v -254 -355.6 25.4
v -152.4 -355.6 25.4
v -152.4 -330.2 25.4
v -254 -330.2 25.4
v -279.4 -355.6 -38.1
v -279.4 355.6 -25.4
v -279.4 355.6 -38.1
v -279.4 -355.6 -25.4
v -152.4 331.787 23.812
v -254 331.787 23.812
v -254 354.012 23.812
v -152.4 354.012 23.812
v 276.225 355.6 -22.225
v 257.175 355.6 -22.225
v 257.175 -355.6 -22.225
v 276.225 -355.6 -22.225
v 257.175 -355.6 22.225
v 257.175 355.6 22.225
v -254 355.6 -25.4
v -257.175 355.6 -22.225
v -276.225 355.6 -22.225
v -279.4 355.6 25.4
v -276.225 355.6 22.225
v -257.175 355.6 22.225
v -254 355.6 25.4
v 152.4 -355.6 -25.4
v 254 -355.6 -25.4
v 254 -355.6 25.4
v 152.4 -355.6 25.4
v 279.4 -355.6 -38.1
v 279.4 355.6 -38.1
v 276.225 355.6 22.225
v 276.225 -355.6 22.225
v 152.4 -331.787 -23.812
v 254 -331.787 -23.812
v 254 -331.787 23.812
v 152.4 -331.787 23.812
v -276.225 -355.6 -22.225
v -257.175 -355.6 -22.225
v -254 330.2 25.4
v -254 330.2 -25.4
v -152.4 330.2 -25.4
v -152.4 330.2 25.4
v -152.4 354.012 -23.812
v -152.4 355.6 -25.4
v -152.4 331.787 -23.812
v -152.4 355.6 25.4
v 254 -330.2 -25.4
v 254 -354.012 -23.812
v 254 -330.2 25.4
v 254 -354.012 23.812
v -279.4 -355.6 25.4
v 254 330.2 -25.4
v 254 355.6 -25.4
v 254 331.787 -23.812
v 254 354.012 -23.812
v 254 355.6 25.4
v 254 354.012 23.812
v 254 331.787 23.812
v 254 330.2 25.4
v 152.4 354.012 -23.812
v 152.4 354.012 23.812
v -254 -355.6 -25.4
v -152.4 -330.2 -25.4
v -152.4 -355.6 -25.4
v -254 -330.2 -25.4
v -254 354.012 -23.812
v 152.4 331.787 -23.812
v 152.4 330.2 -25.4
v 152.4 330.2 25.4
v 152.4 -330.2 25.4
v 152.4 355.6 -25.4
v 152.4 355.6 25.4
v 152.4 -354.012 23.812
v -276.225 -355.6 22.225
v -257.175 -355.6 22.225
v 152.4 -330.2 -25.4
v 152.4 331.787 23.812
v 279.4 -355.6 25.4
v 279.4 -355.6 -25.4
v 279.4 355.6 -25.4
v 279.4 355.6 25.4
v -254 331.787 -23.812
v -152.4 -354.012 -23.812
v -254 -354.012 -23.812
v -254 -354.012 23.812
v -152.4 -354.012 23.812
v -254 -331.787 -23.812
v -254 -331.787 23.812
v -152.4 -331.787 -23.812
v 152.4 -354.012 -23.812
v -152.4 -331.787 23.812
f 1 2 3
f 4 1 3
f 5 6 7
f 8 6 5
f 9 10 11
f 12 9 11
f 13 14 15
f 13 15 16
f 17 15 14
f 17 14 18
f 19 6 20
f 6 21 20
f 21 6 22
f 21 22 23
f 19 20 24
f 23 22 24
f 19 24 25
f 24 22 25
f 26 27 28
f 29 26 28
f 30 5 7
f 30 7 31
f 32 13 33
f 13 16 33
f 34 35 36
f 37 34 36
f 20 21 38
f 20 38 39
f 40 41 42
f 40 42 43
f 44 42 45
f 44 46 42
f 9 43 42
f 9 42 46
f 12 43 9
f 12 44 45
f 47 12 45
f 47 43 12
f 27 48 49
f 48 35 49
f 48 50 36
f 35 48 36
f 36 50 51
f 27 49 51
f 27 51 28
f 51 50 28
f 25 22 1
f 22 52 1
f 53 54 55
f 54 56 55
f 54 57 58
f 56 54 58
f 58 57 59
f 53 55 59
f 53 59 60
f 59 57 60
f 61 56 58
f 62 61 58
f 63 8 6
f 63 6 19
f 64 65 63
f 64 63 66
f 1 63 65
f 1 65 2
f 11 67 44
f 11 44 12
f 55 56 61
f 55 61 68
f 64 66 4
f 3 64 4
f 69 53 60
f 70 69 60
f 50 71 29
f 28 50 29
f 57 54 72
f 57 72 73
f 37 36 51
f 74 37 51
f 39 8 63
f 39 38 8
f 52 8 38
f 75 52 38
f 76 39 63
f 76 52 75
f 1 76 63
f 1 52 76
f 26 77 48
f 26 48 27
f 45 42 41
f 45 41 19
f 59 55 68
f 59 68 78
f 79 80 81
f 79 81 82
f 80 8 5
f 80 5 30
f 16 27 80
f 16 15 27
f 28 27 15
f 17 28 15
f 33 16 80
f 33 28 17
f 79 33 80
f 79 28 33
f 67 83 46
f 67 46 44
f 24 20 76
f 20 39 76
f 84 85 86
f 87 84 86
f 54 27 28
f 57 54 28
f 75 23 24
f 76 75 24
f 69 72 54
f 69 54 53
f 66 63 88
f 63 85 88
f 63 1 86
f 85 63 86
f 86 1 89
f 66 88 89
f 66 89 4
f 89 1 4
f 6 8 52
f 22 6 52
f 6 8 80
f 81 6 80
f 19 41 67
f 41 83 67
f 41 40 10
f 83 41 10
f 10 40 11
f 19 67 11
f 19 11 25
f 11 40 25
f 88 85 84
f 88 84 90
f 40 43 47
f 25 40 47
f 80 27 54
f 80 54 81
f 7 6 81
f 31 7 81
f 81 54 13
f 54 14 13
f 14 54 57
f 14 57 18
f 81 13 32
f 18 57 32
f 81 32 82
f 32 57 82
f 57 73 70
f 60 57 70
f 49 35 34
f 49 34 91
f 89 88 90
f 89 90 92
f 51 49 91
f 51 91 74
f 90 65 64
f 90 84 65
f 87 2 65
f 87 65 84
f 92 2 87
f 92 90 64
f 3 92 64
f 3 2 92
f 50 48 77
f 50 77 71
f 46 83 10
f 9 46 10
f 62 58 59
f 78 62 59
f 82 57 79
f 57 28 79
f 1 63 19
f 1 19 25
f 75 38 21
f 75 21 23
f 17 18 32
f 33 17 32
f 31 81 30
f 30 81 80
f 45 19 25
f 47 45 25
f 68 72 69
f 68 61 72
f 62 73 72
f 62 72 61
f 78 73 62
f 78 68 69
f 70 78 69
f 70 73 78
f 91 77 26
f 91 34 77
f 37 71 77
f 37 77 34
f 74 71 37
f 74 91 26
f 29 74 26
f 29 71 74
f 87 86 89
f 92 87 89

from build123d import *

# Parameters (mm, degrees)
F0_W          = 25.4
F0_H          = 50.8
F0_W_2        = 19.05
F0_H_2        = 44.45
F1_DEPTH      = 355.6
F1_DEPTH_BACK = 355.6
F2_W          = 558.8
F2_H          = 711.2
F3_DEPTH      = 12.7
F4_W          = 25.4
F4_H          = 50.8
F4_W_2        = 22.225
F4_H_2        = 47.625
F5_DEPTH      = 101.6
F6_W          = 25.4
F6_H          = 50.8
F6_W_2        = 22.225
F6_H_2        = 47.625
F7_DEPTH      = 101.6


with BuildPart() as f1:
    # F0 (on Front) → F1 (new body, two sides)
    with BuildSketch(Plane.XZ) as f1_sk:
        with Locations((-266.7, 0)):
            Rectangle(F0_W, F0_H)
        with Locations((-266.7, 0)):
            Rectangle(F0_W_2, F0_H_2, mode=Mode.SUBTRACT)
        with Locations((266.7, 0)):
            Rectangle(F0_W, F0_H)
        with Locations((266.7, 0)):
            Rectangle(F0_W_2, F0_H_2, mode=Mode.SUBTRACT)
    extrude(amount=F1_DEPTH)
    extrude(f1_sk.sketch, amount=-F1_DEPTH_BACK)


with BuildPart() as f3:
    # F2 (on face) → F3 (new body)
    with BuildSketch(Plane(origin=(0, 0, -25.4), x_dir=(1, 0, 0), z_dir=(0, 0, -1))):
        Rectangle(F2_W, F2_H)
    extrude(amount=F3_DEPTH)


with BuildPart() as f5:
    # F4 (on face) → F5 (new body)
    with BuildSketch(Plane(origin=(254, 0, 0), x_dir=(0, -1, 0), z_dir=(-1, 0, 0))):
        with Locations((-342.9, 0)):
            Rectangle(F4_W, F4_H)
        with Locations((-342.9, 0)):
            Rectangle(F4_W_2, F4_H_2, mode=Mode.SUBTRACT)
        with Locations((342.9, 0)):
            Rectangle(F4_W, F4_H)
        with Locations((342.9, 0)):
            Rectangle(F4_W_2, F4_H_2, mode=Mode.SUBTRACT)
    extrude(amount=F5_DEPTH)


with BuildPart() as f7:
    # F6 (on face) → F7 (new body)
    with BuildSketch(Plane.YZ.offset(-254)):
        with Locations((-342.9, 0)):
            Rectangle(F6_W, F6_H)
        with Locations((-342.9, 0)):
            Rectangle(F6_W_2, F6_H_2, mode=Mode.SUBTRACT)
        with Locations((342.9, 0)):
            Rectangle(F6_W, F6_H)
        with Locations((342.9, 0)):
            Rectangle(F6_W_2, F6_H_2, mode=Mode.SUBTRACT)
    extrude(amount=F7_DEPTH)


solid = Compound([f1.part, f3.part, f5.part, f7.part])
